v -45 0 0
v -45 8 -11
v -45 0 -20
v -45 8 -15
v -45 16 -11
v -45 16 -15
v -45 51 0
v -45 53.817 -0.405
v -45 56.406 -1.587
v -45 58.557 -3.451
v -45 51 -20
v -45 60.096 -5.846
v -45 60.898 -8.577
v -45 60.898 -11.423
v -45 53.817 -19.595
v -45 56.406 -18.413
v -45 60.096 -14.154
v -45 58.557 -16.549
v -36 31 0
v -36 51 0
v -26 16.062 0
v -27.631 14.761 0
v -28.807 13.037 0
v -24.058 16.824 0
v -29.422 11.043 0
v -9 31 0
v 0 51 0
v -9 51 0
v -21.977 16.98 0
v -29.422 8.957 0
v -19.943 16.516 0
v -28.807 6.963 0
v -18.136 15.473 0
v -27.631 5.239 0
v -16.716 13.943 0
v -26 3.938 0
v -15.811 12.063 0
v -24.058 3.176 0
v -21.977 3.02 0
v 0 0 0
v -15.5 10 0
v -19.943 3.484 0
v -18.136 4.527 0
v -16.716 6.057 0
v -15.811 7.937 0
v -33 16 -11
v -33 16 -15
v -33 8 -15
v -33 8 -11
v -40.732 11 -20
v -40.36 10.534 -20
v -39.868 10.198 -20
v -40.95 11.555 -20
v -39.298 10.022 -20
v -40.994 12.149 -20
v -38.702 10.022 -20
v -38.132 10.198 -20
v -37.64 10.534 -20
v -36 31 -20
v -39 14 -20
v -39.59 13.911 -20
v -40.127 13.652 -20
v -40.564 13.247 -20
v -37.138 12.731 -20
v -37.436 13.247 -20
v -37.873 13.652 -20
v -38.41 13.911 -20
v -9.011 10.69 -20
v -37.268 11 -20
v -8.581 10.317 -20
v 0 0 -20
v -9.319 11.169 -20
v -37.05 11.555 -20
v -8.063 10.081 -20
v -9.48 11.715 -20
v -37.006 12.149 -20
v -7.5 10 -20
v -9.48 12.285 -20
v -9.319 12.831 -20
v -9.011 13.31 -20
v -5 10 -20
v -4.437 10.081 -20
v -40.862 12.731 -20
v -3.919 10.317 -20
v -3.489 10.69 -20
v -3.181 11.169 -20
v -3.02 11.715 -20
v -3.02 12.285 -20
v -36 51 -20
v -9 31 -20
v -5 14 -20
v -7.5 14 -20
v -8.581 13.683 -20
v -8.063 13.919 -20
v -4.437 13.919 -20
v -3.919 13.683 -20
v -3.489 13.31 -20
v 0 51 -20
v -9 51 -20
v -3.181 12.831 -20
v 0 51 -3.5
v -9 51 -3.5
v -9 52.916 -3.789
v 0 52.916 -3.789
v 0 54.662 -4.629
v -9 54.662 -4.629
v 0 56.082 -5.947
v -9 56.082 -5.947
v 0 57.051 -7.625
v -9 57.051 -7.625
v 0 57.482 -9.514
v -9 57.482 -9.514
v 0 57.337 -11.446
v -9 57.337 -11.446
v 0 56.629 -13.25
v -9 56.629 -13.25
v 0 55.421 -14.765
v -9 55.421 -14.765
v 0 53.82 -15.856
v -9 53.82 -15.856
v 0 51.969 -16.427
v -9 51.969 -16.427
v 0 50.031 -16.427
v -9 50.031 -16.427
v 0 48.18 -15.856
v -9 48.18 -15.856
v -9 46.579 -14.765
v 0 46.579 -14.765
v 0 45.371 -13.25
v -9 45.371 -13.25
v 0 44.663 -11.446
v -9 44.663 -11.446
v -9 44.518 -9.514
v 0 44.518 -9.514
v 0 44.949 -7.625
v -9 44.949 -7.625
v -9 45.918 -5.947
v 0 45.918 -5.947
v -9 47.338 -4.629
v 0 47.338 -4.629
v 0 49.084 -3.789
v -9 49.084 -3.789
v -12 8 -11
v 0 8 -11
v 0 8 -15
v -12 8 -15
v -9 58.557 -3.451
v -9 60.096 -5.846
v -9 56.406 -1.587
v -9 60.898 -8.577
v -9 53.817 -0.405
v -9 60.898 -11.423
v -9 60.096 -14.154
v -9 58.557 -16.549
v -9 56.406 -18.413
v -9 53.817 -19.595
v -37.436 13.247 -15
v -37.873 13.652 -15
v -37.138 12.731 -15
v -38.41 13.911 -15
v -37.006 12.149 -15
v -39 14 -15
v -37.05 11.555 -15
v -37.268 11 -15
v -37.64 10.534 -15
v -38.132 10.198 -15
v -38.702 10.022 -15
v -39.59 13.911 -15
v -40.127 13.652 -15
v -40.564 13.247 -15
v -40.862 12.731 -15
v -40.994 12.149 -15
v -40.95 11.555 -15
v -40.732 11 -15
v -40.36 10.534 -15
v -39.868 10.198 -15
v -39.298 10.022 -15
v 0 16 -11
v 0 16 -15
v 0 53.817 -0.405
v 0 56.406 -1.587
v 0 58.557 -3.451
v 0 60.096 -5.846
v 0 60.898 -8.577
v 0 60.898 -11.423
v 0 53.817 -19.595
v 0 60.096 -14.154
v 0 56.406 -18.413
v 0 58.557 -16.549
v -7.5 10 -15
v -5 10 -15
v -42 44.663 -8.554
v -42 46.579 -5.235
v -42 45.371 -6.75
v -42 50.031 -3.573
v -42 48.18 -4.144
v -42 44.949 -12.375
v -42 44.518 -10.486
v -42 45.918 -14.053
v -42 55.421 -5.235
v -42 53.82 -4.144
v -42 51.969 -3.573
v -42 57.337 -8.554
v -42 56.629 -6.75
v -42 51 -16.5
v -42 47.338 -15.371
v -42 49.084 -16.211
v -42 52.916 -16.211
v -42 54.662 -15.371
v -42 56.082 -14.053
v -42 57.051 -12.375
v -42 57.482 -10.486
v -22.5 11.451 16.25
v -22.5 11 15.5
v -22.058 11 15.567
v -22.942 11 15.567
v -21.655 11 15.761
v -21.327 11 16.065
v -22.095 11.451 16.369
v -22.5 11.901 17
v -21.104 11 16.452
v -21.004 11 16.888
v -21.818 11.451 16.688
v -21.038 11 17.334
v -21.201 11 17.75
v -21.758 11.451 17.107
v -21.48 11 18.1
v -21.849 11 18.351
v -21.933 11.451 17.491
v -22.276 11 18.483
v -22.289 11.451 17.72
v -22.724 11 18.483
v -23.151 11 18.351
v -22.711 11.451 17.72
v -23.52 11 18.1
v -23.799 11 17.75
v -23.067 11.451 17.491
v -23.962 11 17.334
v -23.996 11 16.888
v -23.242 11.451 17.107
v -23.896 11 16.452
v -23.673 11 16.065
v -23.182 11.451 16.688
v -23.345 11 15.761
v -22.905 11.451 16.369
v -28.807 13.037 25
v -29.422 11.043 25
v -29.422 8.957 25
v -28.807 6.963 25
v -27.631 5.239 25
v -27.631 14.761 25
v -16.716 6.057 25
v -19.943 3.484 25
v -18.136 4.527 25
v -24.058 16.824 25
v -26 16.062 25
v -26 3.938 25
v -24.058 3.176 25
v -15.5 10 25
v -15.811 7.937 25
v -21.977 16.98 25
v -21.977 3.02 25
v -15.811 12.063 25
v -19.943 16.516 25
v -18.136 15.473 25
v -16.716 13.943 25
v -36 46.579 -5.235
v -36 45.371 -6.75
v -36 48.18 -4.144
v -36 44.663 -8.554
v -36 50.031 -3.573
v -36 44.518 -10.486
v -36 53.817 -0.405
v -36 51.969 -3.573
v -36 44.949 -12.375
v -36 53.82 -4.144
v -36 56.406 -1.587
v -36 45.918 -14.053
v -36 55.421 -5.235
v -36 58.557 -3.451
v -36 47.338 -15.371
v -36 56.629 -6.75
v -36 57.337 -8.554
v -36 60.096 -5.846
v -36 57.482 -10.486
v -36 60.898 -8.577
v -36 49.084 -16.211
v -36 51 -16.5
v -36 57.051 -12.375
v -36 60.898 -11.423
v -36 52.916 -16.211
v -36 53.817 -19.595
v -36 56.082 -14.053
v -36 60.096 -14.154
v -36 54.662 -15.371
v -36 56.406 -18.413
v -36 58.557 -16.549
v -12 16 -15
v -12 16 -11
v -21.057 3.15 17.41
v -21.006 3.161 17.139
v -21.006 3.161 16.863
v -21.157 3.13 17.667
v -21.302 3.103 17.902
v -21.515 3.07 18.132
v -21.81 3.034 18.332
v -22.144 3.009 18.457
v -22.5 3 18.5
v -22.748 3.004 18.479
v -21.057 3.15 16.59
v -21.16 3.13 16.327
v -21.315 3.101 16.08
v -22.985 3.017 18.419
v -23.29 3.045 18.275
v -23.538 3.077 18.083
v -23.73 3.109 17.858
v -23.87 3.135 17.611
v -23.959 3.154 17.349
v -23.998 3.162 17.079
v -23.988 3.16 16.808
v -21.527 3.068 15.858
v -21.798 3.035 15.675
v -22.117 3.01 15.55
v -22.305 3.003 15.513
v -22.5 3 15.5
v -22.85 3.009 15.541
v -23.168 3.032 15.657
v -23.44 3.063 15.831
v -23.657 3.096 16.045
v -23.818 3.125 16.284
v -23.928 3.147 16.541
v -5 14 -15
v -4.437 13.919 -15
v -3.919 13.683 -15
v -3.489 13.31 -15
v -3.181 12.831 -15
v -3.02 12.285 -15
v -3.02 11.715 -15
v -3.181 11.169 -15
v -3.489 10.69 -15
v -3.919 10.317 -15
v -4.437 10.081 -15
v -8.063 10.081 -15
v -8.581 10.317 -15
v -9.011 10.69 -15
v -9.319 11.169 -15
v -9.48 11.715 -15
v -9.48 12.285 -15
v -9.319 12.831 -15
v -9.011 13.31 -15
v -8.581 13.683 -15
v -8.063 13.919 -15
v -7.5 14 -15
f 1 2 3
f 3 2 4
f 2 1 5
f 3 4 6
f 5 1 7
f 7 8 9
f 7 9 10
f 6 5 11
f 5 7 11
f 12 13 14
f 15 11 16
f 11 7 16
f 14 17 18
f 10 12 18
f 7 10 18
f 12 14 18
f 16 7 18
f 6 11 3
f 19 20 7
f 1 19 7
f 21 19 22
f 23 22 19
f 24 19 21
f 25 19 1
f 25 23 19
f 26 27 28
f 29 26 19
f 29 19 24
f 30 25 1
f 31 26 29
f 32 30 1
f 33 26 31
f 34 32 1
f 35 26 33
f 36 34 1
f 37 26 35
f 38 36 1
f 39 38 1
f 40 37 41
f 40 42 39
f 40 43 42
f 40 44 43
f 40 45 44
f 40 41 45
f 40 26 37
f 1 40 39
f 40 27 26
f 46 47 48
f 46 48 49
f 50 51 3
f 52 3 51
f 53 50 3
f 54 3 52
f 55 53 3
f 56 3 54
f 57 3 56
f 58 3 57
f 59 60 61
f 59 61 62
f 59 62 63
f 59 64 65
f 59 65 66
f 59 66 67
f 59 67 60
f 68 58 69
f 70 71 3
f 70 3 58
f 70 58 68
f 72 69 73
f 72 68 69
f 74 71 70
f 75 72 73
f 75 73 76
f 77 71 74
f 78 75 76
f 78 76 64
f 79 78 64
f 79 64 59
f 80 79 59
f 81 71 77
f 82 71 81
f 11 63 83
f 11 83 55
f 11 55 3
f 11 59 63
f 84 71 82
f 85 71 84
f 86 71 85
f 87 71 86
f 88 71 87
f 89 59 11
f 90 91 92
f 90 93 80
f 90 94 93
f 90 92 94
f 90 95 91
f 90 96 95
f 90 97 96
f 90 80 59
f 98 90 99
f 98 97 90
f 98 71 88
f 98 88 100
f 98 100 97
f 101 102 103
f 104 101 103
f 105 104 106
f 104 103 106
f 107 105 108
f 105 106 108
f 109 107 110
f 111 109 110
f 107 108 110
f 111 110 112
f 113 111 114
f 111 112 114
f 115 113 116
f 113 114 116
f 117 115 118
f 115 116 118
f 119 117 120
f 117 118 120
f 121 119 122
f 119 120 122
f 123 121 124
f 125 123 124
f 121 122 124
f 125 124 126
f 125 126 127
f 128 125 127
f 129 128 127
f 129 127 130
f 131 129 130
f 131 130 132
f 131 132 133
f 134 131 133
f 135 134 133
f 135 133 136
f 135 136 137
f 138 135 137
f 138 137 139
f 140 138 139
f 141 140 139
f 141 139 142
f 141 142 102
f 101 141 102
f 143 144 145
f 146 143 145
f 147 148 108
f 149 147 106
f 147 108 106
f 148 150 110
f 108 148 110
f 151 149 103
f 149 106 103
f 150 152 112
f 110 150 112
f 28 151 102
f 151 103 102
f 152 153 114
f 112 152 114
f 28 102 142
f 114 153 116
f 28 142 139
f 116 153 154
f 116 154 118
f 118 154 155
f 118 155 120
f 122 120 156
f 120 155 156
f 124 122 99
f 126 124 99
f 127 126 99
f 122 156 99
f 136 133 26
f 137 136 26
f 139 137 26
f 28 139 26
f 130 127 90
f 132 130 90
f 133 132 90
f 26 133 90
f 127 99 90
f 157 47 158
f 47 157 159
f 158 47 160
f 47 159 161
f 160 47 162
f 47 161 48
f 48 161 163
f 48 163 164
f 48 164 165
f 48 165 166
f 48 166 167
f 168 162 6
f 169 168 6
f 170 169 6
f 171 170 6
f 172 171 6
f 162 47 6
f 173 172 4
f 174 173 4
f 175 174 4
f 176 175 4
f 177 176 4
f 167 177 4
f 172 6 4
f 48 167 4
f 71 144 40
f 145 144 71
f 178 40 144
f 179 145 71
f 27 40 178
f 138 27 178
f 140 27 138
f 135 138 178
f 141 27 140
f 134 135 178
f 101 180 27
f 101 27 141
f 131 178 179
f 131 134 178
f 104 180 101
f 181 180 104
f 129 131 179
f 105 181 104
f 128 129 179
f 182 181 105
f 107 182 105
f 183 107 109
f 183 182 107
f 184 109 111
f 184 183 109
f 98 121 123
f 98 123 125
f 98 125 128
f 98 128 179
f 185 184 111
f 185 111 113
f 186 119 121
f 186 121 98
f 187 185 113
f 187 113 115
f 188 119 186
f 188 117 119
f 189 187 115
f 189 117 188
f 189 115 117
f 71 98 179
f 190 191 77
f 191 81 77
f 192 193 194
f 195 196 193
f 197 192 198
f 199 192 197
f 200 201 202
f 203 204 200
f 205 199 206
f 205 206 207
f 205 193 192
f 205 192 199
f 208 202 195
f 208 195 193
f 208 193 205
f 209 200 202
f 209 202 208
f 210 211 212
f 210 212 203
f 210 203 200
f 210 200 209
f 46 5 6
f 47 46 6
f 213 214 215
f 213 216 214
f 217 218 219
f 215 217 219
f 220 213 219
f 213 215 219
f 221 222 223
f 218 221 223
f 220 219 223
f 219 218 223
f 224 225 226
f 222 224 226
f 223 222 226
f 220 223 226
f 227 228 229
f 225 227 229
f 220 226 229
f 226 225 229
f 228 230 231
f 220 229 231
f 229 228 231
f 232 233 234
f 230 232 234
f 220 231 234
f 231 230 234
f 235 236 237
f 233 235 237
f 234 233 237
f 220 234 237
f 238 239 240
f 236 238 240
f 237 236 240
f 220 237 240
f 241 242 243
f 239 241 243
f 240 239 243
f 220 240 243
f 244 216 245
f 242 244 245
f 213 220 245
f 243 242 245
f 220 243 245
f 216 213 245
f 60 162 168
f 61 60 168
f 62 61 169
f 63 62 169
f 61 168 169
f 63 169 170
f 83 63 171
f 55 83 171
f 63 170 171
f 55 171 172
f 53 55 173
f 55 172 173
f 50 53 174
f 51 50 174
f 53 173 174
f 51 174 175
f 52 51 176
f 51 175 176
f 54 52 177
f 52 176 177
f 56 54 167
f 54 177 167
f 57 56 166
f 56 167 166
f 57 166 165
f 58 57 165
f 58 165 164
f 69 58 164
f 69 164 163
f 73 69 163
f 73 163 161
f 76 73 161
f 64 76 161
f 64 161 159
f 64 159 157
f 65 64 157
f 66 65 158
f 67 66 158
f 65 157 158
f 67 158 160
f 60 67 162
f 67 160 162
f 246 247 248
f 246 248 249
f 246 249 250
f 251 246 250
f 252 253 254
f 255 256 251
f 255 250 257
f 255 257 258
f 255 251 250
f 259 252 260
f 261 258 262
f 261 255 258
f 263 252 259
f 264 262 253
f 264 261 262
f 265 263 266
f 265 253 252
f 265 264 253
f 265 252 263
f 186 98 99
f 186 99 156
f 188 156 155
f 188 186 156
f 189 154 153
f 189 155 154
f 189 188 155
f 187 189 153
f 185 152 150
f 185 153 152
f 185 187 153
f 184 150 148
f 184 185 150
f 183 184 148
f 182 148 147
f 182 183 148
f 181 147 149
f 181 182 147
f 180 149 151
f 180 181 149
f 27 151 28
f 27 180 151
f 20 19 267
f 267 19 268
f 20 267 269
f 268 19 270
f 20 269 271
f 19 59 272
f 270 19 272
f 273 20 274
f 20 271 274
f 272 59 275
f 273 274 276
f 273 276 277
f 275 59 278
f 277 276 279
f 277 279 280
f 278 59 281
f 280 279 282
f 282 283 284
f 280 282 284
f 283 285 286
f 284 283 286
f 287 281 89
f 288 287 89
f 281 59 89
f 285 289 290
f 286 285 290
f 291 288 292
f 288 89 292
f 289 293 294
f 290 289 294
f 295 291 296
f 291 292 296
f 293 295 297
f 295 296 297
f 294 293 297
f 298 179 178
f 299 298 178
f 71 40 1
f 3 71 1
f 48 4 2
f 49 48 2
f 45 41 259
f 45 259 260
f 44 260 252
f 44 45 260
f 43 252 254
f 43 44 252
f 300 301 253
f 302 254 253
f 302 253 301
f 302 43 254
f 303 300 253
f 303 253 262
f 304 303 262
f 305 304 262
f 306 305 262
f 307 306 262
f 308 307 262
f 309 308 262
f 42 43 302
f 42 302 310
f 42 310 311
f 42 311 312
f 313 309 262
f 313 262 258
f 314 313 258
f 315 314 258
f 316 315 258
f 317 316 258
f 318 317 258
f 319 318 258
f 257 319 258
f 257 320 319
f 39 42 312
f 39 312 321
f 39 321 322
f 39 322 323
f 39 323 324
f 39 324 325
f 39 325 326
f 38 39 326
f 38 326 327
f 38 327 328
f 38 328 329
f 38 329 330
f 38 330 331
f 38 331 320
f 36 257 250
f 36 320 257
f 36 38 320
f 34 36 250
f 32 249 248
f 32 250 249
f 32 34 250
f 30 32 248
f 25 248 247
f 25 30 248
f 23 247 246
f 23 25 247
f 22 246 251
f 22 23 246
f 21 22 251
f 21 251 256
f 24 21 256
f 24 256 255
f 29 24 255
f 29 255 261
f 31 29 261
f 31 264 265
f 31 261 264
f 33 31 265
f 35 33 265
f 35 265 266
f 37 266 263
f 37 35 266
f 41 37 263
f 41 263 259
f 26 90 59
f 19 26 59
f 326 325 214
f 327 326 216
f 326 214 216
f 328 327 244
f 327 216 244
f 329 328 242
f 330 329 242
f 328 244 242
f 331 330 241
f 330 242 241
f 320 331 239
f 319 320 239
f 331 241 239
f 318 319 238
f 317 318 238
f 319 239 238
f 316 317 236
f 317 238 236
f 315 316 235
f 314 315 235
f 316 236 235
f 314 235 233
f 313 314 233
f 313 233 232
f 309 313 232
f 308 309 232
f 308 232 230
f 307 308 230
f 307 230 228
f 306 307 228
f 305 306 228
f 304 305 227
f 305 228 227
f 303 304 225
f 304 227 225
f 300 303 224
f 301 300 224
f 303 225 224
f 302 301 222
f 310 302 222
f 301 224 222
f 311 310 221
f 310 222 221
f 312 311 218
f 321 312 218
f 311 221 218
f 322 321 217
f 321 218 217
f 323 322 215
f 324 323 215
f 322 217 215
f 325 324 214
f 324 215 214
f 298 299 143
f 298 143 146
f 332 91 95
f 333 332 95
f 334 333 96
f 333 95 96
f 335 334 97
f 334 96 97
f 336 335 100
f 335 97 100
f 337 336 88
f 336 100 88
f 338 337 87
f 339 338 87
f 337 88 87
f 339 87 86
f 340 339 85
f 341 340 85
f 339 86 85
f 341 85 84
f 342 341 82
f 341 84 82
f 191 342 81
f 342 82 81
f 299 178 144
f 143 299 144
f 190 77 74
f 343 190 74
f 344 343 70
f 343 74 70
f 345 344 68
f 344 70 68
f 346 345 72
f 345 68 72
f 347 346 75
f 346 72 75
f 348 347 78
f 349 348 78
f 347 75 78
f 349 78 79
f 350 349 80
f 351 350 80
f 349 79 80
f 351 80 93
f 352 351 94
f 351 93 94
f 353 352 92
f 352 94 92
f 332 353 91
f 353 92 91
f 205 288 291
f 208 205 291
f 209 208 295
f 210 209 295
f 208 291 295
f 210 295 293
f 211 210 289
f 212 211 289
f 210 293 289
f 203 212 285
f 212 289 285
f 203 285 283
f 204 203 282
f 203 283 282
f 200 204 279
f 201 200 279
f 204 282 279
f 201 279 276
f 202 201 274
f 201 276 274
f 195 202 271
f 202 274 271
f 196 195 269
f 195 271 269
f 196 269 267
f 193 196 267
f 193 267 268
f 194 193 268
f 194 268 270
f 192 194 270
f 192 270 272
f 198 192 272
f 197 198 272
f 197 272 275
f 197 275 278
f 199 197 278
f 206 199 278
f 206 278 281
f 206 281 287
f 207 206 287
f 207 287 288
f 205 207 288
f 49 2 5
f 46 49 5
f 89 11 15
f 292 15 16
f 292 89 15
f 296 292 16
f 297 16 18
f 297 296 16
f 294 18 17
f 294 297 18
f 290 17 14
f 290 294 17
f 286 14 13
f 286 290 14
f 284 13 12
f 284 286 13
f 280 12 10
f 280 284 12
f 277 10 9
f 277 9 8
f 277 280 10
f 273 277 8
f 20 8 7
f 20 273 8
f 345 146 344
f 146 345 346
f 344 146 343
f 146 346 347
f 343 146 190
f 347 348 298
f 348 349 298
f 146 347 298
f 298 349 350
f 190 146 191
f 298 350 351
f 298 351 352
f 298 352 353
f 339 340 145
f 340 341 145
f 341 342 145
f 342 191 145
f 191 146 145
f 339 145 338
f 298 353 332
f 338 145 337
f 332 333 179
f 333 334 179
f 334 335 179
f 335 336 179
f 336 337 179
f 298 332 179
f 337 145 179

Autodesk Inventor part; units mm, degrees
ref_plane "YZ Plane" through (0, 0, 0) normal (1, 0, 0) x (0, 1, 0)
ref_plane "XZ Plane" through (0, 0, 0) normal (0, 1, 0) x (-1, 0, 0)
sketch "Sketch15" plane through (0, 0, 0) normal (0, 1, 0) x (-1, 0, 0)
  line L0 (0, 0) -> (45, 0)
  line L1 (45, 0) -> (45, -20)
  line L2 (45, -20) -> (0, -20)
  line L3 (0, -20) -> (0, 0)
  dimension "d88" = 45
  dimension "d89" = 20
extrude "Extrusion11" add sketch "Sketch15" along normal blind 20
sketch "Sketch16" plane through (-45, 0, 0) normal (0, 0, 1) x (1, 0, 0)
  line L0 (45, 0) -> (45, 20) projected
  line L1 (0, 20) -> (45, 20) projected
  circle A0 centre (22.5, 10) radius 7
  dimension "d92" = 14
  dimension "d93" = 10
  dimension "d94" = 22.5
extrude "Extrusion12" add sketch "Sketch16" along normal blind 25
sketch "Sketch17" plane through (0, 0, 0) normal (1, 0, 0) x (0, 0, -1)
  line L0 (20, 0) -> (20, 20) projected
  line L1 (0, 0) -> (0, 20) projected
  line L2 (-25, 17) -> (-25, 3) projected
  line L3 (0, 3) -> (0, 17) projected
  line L4 (-25, 10) -> (20, 10) construction
  line L5 (0, 20) -> (20, 20)
  line L6 (20, 20) -> (20, 51)
  line L7 (0, 51) -> (0, 20)
  arc A0 (20, 51) -> (0, 51) centre (10, 51) ccw
  circle A1 centre (10, 51) radius 6.5 construction
  dimension "d98" = 41
  dimension "d99" = 13
extrude "Extrusion13" add sketch "Sketch17" against normal up to surface (45 mm away)
sketch "Sketch18" plane through (0, 0, -20) normal (0, 0, -1) x (-1, 0, 0)
  line L0 (0, 61) -> (45, 61) projected
  line L1 (9, 31) -> (36, 31)
  line L2 (36, 31) -> (36, 61)
  line L3 (36, 61) -> (9, 61)
  line L4 (9, 61) -> (9, 31)
  line L5 (45, 61) -> (45, 51) projected
  line L6 (0, 61) -> (0, 51) projected
  line L7 (0, 51) -> (45, 51) projected
  line L8 (14.6068, 31.9261) -> (20.6068, 31.9261)
  line L9 (20.6068, 31.9261) -> (20.6068, 53.9261)
  line L10 (20.6068, 53.9261) -> (14.6068, 53.9261)
  line L11 (14.6068, 53.9261) -> (14.6068, 31.9261)
  line L12 (20.6068, 25.659) -> (25.6068, 25.659)
  line L13 (25.6068, 25.659) -> (25.6068, 59.659)
  line L14 (25.6068, 59.659) -> (20.6068, 59.659)
  line L15 (20.6068, 59.659) -> (20.6068, 25.659)
  point P0 (40, 20)
  point P1 (0, 20)
  dimension "d105" = 30
  dimension "d106" = 9
  dimension "d107" = 9
  dimension "d116" = 20
  dimension "d117" = 6
  dimension "d118" = 22
  dimension "d119" = 5
  dimension "d120" = 34
  dimension "d121" = 10.3932
  dimension "d122" = 11.6068
extrude "Extrusion14" cut sketch "Sketch18" against normal through all contours L0 L2 L7 L13 L14 L15 L10 L11 L4 | L7 L11 L8 L15 L1 L4 | L2 L1 L13 L7 | L11 L10 L9 L7 | L7 L9 L8 L11 | L13 L1 L15 L9 L7 | L7 L9 L15 L14 L13
sketch "Sketch19" plane through (-36, 31, -20) normal (1, 0, 0) x (0, 0, -1)
  arc A0 (0, 20) -> (-20, 20) centre (-10, 20) ccw projected
  circle A1 centre (-10, 20) radius 6.5
  point P0 (-20, -31)
  point P1 (0, 22.9052)
  dimension "d110" = 13
extrude "Extrusion15" cut sketch "Sketch19" against normal blind 6
sketch "Sketch20" plane through (-9, 31, -20) normal (-1, 0, 0) x (0, 0, 1)
  arc A0 (20, 20) -> (0, 20) centre (10, 20) ccw projected
  circle A1 centre (10, 20) radius 6.5
  point P0 (20, -31)
  point P1 (0, 22.9052)
  dimension "d113" = 13
extrude "Extrusion16" cut sketch "Sketch20" against normal through all
sketch "Sketch21" plane through (0, 0, -20) normal (0, 0, -1) x (-1, 0, 0)
  line L0 (36, 31) -> (9, 31) projected
  line L1 (45, 0) -> (30, 0)
  line L2 (30, 0) -> (30, 31)
  line L3 (30, 31) -> (45, 31)
  line L4 (45, 31) -> (45, 0)
  line L5 (0, 0) -> (15, 0)
  line L6 (15, 0) -> (15, 31)
  line L7 (15, 31) -> (0, 31)
  line L8 (0, 31) -> (0, 0)
  line L9 (45, 0) -> (0, 0) projected
  line L10 (9, 31) -> (36, 31) projected
  line L11 (22.5, 31) -> (22.5, 0) construction
  point P0 (6, 19.5)
  point P1 (39, 19.5)
  dimension "d123" = 15
  dimension "d124" = 15
  dimension "d132" = 16.5
  dimension "d133" = 16.5
extrude "Extrusion17" [suppressed]
sketch "Sketch22" plane through (-45, 0, 0) normal (-1, 0, 0) x (0, 0, 1)
  line L0 (0, 0) -> (-20, 0) projected
  line L1 (-30, 23) -> (-20, 23)
  line L2 (-20, 23) -> (-20, 0)
  line L3 (-20, 0) -> (-30, 0)
  line L4 (-30, 0) -> (-30, 23)
  point P0 (-30, 0)
extrude "Extrusion18" [suppressed]
sketch "Sketch23" plane through (0, 51, -10) normal (1, 0, 0) x (0, 0, -1)
  line L0 (10, -43) -> (10, -20) projected
  line L1 (20, -43) -> (10, -43)
  line L2 (10, -43) -> (10, -20)
  line L3 (10, -20) -> (20, -20)
  line L4 (20, -20) -> (20, -43)
extrude "Extrusion19" [suppressed]
sketch "Sketch24" plane through (12, 43, -10) normal (1, 0, 0) x (0, 0, -1)
  line L0 (10, -20) -> (10, -43) projected
  line L1 (20, -20) -> (10, -20)
  line L2 (10, -20) -> (10, -31.5)
  line L3 (10, -31.5) -> (20, -31.5)
  line L4 (20, -31.5) -> (20, -20)
  point P0 (-10, -43)
revolve "Revolution1" [suppressed]
sketch "Sketch25" plane through (0, 0, -30) normal (0, 0, -1) x (-1, 0, 0)
  line L0 (15, 0) -> (-12, 0) projected
  line L1 (15, 0) -> (15, 23) projected
  line L2 (15, 23) -> (-12, 23) projected
  arc A0 (-12, 23) -> (-12, 0) centre (-12, 11.5) ccw projected
  point P0 (0, 0)
  point P1 (-3.6176, 11.5)
  point P2 (49.207, 11.5)
sketch "Sketch26" plane through (0, 0, -20) normal (0, 0, -1) x (-1, 0, 0)
  line L0 (0, 0) -> (0, 51) projected
  line L1 (45, 0) -> (0, 0) projected
  line L2 (45, 0) -> (45, 51) projected
  line L3 (-6.2428, 12) -> (58.3359, 12)
  point P0 (6, 12)
  point P1 (39, 12)
  dimension "d134" = 12
  dimension "d135" = 6
  dimension "d136" = 33
  dimension "d137" = 6
hole "Hole2" at (-39, 12, -20) direction (0, 0, 1) diameter 4 depth 6 tip angle 118
sketch "Sketch27" plane through (0, 0, 0) normal (1, 0, 0) x (0, 0, -1)
  line L0 (0, 10) -> (0, 14) projected
  line L1 (20, 14) -> (20, 10) projected
  line L2 (15, 16) -> (11, 16)
  line L3 (11, 16) -> (11, 8)
  line L4 (11, 8) -> (15, 8)
  line L5 (15, 8) -> (15, 16)
  line L6 (15, 12) -> (11, 12)
  line L7 (20, 14) -> (20, 10) projected
  line L8 (0, 0) -> (0, 51) projected
  line L9 (20, 14) -> (20, 10) projected
  line L10 (20, 31) -> (20, 51) projected
  line L11 (20, 0) -> (20, 51) projected
  line L12 (20, 0) -> (20, 51) projected
  line L13 (20, 51) -> (20, 31) projected
  line L14 (20, 14) -> (20, 10) projected
  line L15 (20, 12) -> (0, 12)
  dimension "d145" = 8
  dimension "d147" = 4
  dimension "d160" = 5
extrude "Extrusion20" cut sketch "Sketch27" against normal blind 12
sketch "Sketch28" plane through (0, 0, -20) normal (0, 0, -1) x (-1, 0, 0)
  line L0 (0, 0) -> (0, 51) projected
  line L1 (5, 12) -> (7.5, 12) construction
  line L2 (5, 10) -> (7.5, 10)
  line L3 (7.5, 14) -> (5, 14)
  arc A0 (5, 14) -> (5, 10) centre (5, 12) ccw
  arc A1 (7.5, 10) -> (7.5, 14) centre (7.5, 12) ccw
  point P0 (6.25, 12)
  dimension "d150" = 5
  dimension "d151" = 2.5
extrude "Extrusion21" cut sketch "Sketch28" against normal up to surface (9 mm away)
sketch "Sketch29" plane through (-45, 0, -20) normal (-1, 0, 0) x (0, 0, 1)
  line L0 (0, 0) -> (0, 51) projected
  line L1 (20, 0) -> (20, 43)
  line L2 (0, 10) -> (0, 14)
  line L3 (20, 14) -> (20, 10)
  line L4 (9, 16) -> (5, 16)
  line L5 (5, 16) -> (5, 8)
  line L6 (5, 8) -> (9, 8)
  line L7 (9, 8) -> (9, 16)
  line L8 (9, 12) -> (5, 12)
  line L9 (20, 14) -> (20, 10)
  line L10 (20, 12) -> (0, 12) construction
  line L11 (0, 10) -> (0, 14) projected
  dimension "d154" = 8
  dimension "d156" = 4
  dimension "d157" = 5
extrude "Extrusion22" cut sketch "Sketch29" against normal blind 12
ref_plane "Work Plane2" through (-22.5, 3, 0) normal (0, 1, 0) x (-1, 0, 0)
sketch "Sketch30" plane through (-22.5, 3, 0) normal (0, 1, 0) x (-1, 0, 0)
  line L0 (7, 25) -> (-7, 25) projected
  line L1 (-7, 0) -> (7, 0) projected
  point P0 (-22.5, 0)
  point P1 (0, 17)
  dimension "d161" = 8
hole "Hole3" at (-22.5, 3, 17) direction (0, 1, 0) diameter 3 depth 8 tip angle 118
equation "\"d106\" = d107"
equation "\"d124\" = d123"
properties part number "EndEffectorV2"
